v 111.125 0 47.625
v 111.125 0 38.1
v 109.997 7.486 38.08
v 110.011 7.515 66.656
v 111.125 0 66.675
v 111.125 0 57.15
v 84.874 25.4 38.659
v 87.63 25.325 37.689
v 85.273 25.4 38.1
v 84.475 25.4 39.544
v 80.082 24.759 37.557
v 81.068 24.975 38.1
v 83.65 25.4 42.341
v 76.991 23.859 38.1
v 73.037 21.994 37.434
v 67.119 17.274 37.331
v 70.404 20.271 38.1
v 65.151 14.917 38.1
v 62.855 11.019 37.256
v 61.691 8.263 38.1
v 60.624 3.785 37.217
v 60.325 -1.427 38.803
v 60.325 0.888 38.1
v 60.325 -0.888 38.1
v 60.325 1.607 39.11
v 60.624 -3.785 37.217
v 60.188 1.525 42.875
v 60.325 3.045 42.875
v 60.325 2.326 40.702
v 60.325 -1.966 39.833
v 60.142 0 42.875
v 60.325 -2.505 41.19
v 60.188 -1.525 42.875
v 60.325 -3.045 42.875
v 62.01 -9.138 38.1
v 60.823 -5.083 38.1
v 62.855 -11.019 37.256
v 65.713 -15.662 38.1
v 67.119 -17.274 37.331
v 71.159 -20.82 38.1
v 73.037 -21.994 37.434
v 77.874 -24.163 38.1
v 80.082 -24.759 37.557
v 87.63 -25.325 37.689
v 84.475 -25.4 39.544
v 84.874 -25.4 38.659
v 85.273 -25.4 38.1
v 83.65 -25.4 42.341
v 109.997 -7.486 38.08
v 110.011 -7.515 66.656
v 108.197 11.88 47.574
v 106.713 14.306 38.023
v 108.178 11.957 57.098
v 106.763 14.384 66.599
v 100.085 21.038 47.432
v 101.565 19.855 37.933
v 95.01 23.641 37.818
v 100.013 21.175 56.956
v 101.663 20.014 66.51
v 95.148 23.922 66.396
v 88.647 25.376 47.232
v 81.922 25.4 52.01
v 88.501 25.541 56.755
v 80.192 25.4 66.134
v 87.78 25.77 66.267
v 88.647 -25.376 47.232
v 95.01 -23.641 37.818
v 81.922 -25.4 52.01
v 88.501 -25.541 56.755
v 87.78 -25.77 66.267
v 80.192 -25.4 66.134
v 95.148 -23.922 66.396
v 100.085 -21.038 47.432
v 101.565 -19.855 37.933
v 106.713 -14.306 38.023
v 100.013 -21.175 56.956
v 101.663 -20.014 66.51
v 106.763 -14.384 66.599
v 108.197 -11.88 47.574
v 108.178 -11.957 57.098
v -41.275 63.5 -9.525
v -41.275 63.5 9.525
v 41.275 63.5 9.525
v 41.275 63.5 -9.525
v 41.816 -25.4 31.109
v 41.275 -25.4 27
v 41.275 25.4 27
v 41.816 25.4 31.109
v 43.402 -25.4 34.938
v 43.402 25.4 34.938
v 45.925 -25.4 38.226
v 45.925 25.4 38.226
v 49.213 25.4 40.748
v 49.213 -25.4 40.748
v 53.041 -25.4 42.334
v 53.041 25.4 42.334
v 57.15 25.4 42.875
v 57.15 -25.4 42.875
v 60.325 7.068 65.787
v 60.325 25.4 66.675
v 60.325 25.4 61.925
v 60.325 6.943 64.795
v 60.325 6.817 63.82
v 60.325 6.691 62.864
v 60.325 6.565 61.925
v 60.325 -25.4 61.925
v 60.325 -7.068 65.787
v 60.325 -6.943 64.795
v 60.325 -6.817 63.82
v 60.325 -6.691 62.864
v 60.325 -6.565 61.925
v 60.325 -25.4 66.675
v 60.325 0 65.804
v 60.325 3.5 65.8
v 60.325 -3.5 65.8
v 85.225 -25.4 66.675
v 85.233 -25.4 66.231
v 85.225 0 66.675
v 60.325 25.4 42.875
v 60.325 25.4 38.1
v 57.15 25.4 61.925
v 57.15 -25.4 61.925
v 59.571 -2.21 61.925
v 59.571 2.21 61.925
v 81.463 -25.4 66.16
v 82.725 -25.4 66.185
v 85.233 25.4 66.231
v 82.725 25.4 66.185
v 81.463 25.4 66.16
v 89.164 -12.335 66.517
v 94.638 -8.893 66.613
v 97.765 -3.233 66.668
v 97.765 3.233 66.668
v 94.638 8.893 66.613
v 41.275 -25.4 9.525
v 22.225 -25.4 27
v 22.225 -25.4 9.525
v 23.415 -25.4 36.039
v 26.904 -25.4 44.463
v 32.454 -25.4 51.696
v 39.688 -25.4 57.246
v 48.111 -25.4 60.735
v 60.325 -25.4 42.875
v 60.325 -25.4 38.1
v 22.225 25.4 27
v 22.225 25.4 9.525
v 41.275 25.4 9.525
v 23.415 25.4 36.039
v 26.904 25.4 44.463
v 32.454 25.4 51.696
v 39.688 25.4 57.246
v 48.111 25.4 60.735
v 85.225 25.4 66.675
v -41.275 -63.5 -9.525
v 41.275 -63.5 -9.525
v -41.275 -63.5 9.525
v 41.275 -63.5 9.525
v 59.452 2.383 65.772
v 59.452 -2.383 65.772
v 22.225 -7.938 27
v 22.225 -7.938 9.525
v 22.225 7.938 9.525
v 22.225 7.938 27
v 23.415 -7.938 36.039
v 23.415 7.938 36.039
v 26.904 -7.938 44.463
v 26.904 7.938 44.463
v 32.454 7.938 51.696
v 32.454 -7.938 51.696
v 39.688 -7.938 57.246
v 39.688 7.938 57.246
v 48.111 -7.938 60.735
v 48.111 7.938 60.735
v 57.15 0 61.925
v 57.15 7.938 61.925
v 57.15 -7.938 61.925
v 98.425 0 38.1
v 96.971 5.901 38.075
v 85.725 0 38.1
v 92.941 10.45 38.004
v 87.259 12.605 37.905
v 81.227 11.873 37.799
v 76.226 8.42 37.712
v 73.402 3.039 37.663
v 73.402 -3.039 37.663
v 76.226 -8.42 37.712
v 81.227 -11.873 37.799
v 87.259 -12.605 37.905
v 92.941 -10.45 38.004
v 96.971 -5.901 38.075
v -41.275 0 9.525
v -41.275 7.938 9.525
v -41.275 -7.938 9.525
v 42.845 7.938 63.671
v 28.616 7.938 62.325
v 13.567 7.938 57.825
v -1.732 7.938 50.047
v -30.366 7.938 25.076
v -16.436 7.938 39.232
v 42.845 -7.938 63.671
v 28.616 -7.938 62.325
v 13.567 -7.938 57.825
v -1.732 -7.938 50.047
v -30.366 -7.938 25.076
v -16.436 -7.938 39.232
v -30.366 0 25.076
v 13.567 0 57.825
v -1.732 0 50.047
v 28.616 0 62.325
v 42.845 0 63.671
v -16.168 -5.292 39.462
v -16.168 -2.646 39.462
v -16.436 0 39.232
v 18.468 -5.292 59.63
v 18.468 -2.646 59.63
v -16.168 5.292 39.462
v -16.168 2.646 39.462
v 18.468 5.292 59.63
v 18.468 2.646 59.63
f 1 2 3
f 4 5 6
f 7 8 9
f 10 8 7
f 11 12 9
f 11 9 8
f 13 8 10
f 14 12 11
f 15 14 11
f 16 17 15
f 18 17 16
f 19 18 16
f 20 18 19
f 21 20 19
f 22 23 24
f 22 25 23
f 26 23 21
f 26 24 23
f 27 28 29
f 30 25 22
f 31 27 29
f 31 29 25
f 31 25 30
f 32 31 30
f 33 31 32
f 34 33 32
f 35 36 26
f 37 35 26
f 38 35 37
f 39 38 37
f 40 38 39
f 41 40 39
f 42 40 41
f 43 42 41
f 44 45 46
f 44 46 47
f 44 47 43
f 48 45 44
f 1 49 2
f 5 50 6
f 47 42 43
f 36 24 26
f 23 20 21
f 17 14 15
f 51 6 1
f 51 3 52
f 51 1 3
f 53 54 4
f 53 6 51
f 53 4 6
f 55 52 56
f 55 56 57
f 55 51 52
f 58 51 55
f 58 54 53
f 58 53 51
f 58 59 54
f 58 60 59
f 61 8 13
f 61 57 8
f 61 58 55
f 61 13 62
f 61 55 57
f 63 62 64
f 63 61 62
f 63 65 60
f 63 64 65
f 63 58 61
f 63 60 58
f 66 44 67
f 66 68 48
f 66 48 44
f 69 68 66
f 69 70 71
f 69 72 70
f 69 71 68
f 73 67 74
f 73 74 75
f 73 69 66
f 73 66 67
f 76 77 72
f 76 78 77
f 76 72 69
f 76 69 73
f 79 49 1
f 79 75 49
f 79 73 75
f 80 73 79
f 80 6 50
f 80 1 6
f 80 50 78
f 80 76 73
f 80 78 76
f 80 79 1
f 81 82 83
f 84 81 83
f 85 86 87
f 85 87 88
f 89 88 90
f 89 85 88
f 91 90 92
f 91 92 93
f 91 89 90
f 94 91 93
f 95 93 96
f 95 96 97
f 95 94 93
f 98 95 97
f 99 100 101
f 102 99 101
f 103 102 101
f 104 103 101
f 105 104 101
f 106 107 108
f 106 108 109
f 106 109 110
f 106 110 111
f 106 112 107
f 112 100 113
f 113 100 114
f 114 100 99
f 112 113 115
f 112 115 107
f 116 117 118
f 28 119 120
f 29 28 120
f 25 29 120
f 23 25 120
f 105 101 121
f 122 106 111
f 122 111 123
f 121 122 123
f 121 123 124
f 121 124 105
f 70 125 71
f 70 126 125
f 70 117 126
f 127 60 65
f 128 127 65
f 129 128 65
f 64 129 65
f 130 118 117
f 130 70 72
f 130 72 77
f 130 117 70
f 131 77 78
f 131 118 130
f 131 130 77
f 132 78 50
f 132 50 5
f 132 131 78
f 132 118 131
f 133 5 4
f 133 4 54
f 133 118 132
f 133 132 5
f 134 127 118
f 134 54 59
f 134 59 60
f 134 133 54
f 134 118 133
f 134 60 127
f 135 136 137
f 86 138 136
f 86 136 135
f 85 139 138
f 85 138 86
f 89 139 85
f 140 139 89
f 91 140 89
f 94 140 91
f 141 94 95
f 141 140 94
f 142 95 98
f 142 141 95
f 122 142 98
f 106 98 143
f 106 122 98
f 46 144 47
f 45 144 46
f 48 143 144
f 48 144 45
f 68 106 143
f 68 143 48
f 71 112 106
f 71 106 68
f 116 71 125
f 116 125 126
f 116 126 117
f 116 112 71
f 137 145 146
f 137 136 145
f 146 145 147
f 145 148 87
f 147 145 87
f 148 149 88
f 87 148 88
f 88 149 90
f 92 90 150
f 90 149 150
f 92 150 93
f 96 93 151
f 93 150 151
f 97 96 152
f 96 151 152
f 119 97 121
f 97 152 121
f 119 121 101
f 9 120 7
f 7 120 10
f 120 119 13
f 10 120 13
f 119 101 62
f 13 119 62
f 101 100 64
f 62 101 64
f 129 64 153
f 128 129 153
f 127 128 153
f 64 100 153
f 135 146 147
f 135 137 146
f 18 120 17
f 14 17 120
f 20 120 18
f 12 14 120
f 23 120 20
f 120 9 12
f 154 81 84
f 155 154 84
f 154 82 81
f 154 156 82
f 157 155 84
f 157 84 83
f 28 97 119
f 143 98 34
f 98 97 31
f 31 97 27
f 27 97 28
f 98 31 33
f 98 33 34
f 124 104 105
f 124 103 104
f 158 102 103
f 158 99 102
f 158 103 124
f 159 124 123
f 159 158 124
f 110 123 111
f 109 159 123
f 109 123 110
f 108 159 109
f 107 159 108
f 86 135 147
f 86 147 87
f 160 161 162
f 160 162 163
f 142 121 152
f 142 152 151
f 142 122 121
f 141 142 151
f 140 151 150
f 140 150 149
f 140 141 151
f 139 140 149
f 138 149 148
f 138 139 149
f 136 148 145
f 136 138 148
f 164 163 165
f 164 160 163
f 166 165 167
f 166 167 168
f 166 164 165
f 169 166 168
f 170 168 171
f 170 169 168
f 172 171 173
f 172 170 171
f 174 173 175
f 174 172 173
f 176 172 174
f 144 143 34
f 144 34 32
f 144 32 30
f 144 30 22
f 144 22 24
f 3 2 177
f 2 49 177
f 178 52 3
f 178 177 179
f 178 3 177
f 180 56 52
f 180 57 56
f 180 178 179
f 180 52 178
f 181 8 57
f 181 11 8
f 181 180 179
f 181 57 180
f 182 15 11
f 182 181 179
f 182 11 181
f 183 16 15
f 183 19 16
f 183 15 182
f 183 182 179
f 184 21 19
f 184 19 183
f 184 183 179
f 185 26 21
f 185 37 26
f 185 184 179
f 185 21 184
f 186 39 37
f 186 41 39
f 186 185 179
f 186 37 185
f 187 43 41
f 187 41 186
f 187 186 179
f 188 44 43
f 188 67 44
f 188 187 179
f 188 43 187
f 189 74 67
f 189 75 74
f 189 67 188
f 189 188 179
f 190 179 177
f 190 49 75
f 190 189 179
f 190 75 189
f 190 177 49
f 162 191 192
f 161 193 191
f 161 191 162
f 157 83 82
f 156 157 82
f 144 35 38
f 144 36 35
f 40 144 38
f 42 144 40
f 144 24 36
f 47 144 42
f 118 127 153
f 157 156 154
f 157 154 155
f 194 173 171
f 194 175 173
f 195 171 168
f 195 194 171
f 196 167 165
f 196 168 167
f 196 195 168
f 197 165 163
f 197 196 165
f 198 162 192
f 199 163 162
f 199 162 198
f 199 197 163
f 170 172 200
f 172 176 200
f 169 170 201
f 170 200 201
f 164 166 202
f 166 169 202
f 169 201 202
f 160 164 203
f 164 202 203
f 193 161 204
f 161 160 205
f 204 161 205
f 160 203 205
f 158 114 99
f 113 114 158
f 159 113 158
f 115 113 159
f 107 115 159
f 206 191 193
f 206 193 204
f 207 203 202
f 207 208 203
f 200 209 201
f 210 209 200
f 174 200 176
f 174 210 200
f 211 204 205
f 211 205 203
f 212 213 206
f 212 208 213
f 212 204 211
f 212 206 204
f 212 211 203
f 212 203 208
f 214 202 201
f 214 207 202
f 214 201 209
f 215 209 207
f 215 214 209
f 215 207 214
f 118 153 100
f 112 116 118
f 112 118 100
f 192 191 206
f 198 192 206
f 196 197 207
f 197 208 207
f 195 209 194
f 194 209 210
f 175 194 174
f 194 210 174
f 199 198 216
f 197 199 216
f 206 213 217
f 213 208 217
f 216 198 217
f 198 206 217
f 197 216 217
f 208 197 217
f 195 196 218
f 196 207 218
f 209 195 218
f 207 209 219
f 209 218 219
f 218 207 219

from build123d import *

# Parameters (mm, degrees)
F1_DEPTH = 63.5
F2_DEPTH = 25.4
F3_DEPTH = 7.9375


with BuildPart() as f1:
    # F0 (on Front) → F1 (new body, symmetric)
    with BuildSketch(Plane.XZ):
        Polygon((-41.275, 9.525), (-41.275, -9.525), (41.275, -9.525), (41.275, 9.525), (22.225, 9.525), align=None)
    extrude(amount=F1_DEPTH, both=True)


with BuildPart() as f2:
    # F0 (on Front) → F2 (new body, symmetric)
    with BuildSketch(Plane.XZ):
        with BuildLine():
            Line((22.225, 9.525), (41.275, 9.525))
            Line((41.275, 9.525), (41.275, 27.0002))
            ThreePointArc((41.275, 27.0002), (45.9246798487, 38.2255201513), (57.15, 42.8752))
            Line((57.15, 42.8752), (60.325, 42.8752))
            Line((60.325, 42.8752), (60.325, 61.9252))
            Line((60.325, 61.9252), (57.15, 61.9252))
            ThreePointArc((57.15, 61.9252), (32.4542956671, 51.6959043329), (22.225, 27.0002))
            Line((22.225, 27.0002), (22.225, 9.525))
        make_face()
        Polygon((60.325, 66.675), (60.325, 61.9252), (60.325, 42.8752), (60.325, 38.1), (85.725, 38.1), (85.2254782739, 66.675), align=None)
    extrude(amount=F2_DEPTH, both=True)

    # F0 (on Front) → F4 (revolve)
    with BuildSketch(Plane.XZ):
        Polygon((111.125, 66.675), (85.2254782739, 66.675), (85.725, 38.1), (111.125, 38.1), align=None)
    revolve(axis=Axis((85.4752391369, 0, 52.3875), (-0.0174784049, 0, 0.999847241)))


with BuildPart() as f3:
    # F0 (on Front) → F3 (new body, symmetric)
    with BuildSketch(Plane.XZ):
        with BuildLine():
            add(Edge.make_bspline(
                [(-41.275, 9.525), (-22.7622389793, 41.644051671), (18.2747561485, 71.2683945894), (57.15, 61.9252)],
                knots=[0, 0, 0, 0, 111.5045361635, 111.5045361635, 111.5045361635, 111.5045361635], degree=3))
            Line((-41.275, 9.525), (22.225, 9.525))
            Line((22.225, 9.525), (22.225, 27.0002))
            ThreePointArc((22.225, 27.0002), (32.4542956671, 51.6959043329), (57.15, 61.9252))
        make_face()
    extrude(amount=F3_DEPTH, both=True)


solid = Compound([f1.part, f2.part, f3.part])
